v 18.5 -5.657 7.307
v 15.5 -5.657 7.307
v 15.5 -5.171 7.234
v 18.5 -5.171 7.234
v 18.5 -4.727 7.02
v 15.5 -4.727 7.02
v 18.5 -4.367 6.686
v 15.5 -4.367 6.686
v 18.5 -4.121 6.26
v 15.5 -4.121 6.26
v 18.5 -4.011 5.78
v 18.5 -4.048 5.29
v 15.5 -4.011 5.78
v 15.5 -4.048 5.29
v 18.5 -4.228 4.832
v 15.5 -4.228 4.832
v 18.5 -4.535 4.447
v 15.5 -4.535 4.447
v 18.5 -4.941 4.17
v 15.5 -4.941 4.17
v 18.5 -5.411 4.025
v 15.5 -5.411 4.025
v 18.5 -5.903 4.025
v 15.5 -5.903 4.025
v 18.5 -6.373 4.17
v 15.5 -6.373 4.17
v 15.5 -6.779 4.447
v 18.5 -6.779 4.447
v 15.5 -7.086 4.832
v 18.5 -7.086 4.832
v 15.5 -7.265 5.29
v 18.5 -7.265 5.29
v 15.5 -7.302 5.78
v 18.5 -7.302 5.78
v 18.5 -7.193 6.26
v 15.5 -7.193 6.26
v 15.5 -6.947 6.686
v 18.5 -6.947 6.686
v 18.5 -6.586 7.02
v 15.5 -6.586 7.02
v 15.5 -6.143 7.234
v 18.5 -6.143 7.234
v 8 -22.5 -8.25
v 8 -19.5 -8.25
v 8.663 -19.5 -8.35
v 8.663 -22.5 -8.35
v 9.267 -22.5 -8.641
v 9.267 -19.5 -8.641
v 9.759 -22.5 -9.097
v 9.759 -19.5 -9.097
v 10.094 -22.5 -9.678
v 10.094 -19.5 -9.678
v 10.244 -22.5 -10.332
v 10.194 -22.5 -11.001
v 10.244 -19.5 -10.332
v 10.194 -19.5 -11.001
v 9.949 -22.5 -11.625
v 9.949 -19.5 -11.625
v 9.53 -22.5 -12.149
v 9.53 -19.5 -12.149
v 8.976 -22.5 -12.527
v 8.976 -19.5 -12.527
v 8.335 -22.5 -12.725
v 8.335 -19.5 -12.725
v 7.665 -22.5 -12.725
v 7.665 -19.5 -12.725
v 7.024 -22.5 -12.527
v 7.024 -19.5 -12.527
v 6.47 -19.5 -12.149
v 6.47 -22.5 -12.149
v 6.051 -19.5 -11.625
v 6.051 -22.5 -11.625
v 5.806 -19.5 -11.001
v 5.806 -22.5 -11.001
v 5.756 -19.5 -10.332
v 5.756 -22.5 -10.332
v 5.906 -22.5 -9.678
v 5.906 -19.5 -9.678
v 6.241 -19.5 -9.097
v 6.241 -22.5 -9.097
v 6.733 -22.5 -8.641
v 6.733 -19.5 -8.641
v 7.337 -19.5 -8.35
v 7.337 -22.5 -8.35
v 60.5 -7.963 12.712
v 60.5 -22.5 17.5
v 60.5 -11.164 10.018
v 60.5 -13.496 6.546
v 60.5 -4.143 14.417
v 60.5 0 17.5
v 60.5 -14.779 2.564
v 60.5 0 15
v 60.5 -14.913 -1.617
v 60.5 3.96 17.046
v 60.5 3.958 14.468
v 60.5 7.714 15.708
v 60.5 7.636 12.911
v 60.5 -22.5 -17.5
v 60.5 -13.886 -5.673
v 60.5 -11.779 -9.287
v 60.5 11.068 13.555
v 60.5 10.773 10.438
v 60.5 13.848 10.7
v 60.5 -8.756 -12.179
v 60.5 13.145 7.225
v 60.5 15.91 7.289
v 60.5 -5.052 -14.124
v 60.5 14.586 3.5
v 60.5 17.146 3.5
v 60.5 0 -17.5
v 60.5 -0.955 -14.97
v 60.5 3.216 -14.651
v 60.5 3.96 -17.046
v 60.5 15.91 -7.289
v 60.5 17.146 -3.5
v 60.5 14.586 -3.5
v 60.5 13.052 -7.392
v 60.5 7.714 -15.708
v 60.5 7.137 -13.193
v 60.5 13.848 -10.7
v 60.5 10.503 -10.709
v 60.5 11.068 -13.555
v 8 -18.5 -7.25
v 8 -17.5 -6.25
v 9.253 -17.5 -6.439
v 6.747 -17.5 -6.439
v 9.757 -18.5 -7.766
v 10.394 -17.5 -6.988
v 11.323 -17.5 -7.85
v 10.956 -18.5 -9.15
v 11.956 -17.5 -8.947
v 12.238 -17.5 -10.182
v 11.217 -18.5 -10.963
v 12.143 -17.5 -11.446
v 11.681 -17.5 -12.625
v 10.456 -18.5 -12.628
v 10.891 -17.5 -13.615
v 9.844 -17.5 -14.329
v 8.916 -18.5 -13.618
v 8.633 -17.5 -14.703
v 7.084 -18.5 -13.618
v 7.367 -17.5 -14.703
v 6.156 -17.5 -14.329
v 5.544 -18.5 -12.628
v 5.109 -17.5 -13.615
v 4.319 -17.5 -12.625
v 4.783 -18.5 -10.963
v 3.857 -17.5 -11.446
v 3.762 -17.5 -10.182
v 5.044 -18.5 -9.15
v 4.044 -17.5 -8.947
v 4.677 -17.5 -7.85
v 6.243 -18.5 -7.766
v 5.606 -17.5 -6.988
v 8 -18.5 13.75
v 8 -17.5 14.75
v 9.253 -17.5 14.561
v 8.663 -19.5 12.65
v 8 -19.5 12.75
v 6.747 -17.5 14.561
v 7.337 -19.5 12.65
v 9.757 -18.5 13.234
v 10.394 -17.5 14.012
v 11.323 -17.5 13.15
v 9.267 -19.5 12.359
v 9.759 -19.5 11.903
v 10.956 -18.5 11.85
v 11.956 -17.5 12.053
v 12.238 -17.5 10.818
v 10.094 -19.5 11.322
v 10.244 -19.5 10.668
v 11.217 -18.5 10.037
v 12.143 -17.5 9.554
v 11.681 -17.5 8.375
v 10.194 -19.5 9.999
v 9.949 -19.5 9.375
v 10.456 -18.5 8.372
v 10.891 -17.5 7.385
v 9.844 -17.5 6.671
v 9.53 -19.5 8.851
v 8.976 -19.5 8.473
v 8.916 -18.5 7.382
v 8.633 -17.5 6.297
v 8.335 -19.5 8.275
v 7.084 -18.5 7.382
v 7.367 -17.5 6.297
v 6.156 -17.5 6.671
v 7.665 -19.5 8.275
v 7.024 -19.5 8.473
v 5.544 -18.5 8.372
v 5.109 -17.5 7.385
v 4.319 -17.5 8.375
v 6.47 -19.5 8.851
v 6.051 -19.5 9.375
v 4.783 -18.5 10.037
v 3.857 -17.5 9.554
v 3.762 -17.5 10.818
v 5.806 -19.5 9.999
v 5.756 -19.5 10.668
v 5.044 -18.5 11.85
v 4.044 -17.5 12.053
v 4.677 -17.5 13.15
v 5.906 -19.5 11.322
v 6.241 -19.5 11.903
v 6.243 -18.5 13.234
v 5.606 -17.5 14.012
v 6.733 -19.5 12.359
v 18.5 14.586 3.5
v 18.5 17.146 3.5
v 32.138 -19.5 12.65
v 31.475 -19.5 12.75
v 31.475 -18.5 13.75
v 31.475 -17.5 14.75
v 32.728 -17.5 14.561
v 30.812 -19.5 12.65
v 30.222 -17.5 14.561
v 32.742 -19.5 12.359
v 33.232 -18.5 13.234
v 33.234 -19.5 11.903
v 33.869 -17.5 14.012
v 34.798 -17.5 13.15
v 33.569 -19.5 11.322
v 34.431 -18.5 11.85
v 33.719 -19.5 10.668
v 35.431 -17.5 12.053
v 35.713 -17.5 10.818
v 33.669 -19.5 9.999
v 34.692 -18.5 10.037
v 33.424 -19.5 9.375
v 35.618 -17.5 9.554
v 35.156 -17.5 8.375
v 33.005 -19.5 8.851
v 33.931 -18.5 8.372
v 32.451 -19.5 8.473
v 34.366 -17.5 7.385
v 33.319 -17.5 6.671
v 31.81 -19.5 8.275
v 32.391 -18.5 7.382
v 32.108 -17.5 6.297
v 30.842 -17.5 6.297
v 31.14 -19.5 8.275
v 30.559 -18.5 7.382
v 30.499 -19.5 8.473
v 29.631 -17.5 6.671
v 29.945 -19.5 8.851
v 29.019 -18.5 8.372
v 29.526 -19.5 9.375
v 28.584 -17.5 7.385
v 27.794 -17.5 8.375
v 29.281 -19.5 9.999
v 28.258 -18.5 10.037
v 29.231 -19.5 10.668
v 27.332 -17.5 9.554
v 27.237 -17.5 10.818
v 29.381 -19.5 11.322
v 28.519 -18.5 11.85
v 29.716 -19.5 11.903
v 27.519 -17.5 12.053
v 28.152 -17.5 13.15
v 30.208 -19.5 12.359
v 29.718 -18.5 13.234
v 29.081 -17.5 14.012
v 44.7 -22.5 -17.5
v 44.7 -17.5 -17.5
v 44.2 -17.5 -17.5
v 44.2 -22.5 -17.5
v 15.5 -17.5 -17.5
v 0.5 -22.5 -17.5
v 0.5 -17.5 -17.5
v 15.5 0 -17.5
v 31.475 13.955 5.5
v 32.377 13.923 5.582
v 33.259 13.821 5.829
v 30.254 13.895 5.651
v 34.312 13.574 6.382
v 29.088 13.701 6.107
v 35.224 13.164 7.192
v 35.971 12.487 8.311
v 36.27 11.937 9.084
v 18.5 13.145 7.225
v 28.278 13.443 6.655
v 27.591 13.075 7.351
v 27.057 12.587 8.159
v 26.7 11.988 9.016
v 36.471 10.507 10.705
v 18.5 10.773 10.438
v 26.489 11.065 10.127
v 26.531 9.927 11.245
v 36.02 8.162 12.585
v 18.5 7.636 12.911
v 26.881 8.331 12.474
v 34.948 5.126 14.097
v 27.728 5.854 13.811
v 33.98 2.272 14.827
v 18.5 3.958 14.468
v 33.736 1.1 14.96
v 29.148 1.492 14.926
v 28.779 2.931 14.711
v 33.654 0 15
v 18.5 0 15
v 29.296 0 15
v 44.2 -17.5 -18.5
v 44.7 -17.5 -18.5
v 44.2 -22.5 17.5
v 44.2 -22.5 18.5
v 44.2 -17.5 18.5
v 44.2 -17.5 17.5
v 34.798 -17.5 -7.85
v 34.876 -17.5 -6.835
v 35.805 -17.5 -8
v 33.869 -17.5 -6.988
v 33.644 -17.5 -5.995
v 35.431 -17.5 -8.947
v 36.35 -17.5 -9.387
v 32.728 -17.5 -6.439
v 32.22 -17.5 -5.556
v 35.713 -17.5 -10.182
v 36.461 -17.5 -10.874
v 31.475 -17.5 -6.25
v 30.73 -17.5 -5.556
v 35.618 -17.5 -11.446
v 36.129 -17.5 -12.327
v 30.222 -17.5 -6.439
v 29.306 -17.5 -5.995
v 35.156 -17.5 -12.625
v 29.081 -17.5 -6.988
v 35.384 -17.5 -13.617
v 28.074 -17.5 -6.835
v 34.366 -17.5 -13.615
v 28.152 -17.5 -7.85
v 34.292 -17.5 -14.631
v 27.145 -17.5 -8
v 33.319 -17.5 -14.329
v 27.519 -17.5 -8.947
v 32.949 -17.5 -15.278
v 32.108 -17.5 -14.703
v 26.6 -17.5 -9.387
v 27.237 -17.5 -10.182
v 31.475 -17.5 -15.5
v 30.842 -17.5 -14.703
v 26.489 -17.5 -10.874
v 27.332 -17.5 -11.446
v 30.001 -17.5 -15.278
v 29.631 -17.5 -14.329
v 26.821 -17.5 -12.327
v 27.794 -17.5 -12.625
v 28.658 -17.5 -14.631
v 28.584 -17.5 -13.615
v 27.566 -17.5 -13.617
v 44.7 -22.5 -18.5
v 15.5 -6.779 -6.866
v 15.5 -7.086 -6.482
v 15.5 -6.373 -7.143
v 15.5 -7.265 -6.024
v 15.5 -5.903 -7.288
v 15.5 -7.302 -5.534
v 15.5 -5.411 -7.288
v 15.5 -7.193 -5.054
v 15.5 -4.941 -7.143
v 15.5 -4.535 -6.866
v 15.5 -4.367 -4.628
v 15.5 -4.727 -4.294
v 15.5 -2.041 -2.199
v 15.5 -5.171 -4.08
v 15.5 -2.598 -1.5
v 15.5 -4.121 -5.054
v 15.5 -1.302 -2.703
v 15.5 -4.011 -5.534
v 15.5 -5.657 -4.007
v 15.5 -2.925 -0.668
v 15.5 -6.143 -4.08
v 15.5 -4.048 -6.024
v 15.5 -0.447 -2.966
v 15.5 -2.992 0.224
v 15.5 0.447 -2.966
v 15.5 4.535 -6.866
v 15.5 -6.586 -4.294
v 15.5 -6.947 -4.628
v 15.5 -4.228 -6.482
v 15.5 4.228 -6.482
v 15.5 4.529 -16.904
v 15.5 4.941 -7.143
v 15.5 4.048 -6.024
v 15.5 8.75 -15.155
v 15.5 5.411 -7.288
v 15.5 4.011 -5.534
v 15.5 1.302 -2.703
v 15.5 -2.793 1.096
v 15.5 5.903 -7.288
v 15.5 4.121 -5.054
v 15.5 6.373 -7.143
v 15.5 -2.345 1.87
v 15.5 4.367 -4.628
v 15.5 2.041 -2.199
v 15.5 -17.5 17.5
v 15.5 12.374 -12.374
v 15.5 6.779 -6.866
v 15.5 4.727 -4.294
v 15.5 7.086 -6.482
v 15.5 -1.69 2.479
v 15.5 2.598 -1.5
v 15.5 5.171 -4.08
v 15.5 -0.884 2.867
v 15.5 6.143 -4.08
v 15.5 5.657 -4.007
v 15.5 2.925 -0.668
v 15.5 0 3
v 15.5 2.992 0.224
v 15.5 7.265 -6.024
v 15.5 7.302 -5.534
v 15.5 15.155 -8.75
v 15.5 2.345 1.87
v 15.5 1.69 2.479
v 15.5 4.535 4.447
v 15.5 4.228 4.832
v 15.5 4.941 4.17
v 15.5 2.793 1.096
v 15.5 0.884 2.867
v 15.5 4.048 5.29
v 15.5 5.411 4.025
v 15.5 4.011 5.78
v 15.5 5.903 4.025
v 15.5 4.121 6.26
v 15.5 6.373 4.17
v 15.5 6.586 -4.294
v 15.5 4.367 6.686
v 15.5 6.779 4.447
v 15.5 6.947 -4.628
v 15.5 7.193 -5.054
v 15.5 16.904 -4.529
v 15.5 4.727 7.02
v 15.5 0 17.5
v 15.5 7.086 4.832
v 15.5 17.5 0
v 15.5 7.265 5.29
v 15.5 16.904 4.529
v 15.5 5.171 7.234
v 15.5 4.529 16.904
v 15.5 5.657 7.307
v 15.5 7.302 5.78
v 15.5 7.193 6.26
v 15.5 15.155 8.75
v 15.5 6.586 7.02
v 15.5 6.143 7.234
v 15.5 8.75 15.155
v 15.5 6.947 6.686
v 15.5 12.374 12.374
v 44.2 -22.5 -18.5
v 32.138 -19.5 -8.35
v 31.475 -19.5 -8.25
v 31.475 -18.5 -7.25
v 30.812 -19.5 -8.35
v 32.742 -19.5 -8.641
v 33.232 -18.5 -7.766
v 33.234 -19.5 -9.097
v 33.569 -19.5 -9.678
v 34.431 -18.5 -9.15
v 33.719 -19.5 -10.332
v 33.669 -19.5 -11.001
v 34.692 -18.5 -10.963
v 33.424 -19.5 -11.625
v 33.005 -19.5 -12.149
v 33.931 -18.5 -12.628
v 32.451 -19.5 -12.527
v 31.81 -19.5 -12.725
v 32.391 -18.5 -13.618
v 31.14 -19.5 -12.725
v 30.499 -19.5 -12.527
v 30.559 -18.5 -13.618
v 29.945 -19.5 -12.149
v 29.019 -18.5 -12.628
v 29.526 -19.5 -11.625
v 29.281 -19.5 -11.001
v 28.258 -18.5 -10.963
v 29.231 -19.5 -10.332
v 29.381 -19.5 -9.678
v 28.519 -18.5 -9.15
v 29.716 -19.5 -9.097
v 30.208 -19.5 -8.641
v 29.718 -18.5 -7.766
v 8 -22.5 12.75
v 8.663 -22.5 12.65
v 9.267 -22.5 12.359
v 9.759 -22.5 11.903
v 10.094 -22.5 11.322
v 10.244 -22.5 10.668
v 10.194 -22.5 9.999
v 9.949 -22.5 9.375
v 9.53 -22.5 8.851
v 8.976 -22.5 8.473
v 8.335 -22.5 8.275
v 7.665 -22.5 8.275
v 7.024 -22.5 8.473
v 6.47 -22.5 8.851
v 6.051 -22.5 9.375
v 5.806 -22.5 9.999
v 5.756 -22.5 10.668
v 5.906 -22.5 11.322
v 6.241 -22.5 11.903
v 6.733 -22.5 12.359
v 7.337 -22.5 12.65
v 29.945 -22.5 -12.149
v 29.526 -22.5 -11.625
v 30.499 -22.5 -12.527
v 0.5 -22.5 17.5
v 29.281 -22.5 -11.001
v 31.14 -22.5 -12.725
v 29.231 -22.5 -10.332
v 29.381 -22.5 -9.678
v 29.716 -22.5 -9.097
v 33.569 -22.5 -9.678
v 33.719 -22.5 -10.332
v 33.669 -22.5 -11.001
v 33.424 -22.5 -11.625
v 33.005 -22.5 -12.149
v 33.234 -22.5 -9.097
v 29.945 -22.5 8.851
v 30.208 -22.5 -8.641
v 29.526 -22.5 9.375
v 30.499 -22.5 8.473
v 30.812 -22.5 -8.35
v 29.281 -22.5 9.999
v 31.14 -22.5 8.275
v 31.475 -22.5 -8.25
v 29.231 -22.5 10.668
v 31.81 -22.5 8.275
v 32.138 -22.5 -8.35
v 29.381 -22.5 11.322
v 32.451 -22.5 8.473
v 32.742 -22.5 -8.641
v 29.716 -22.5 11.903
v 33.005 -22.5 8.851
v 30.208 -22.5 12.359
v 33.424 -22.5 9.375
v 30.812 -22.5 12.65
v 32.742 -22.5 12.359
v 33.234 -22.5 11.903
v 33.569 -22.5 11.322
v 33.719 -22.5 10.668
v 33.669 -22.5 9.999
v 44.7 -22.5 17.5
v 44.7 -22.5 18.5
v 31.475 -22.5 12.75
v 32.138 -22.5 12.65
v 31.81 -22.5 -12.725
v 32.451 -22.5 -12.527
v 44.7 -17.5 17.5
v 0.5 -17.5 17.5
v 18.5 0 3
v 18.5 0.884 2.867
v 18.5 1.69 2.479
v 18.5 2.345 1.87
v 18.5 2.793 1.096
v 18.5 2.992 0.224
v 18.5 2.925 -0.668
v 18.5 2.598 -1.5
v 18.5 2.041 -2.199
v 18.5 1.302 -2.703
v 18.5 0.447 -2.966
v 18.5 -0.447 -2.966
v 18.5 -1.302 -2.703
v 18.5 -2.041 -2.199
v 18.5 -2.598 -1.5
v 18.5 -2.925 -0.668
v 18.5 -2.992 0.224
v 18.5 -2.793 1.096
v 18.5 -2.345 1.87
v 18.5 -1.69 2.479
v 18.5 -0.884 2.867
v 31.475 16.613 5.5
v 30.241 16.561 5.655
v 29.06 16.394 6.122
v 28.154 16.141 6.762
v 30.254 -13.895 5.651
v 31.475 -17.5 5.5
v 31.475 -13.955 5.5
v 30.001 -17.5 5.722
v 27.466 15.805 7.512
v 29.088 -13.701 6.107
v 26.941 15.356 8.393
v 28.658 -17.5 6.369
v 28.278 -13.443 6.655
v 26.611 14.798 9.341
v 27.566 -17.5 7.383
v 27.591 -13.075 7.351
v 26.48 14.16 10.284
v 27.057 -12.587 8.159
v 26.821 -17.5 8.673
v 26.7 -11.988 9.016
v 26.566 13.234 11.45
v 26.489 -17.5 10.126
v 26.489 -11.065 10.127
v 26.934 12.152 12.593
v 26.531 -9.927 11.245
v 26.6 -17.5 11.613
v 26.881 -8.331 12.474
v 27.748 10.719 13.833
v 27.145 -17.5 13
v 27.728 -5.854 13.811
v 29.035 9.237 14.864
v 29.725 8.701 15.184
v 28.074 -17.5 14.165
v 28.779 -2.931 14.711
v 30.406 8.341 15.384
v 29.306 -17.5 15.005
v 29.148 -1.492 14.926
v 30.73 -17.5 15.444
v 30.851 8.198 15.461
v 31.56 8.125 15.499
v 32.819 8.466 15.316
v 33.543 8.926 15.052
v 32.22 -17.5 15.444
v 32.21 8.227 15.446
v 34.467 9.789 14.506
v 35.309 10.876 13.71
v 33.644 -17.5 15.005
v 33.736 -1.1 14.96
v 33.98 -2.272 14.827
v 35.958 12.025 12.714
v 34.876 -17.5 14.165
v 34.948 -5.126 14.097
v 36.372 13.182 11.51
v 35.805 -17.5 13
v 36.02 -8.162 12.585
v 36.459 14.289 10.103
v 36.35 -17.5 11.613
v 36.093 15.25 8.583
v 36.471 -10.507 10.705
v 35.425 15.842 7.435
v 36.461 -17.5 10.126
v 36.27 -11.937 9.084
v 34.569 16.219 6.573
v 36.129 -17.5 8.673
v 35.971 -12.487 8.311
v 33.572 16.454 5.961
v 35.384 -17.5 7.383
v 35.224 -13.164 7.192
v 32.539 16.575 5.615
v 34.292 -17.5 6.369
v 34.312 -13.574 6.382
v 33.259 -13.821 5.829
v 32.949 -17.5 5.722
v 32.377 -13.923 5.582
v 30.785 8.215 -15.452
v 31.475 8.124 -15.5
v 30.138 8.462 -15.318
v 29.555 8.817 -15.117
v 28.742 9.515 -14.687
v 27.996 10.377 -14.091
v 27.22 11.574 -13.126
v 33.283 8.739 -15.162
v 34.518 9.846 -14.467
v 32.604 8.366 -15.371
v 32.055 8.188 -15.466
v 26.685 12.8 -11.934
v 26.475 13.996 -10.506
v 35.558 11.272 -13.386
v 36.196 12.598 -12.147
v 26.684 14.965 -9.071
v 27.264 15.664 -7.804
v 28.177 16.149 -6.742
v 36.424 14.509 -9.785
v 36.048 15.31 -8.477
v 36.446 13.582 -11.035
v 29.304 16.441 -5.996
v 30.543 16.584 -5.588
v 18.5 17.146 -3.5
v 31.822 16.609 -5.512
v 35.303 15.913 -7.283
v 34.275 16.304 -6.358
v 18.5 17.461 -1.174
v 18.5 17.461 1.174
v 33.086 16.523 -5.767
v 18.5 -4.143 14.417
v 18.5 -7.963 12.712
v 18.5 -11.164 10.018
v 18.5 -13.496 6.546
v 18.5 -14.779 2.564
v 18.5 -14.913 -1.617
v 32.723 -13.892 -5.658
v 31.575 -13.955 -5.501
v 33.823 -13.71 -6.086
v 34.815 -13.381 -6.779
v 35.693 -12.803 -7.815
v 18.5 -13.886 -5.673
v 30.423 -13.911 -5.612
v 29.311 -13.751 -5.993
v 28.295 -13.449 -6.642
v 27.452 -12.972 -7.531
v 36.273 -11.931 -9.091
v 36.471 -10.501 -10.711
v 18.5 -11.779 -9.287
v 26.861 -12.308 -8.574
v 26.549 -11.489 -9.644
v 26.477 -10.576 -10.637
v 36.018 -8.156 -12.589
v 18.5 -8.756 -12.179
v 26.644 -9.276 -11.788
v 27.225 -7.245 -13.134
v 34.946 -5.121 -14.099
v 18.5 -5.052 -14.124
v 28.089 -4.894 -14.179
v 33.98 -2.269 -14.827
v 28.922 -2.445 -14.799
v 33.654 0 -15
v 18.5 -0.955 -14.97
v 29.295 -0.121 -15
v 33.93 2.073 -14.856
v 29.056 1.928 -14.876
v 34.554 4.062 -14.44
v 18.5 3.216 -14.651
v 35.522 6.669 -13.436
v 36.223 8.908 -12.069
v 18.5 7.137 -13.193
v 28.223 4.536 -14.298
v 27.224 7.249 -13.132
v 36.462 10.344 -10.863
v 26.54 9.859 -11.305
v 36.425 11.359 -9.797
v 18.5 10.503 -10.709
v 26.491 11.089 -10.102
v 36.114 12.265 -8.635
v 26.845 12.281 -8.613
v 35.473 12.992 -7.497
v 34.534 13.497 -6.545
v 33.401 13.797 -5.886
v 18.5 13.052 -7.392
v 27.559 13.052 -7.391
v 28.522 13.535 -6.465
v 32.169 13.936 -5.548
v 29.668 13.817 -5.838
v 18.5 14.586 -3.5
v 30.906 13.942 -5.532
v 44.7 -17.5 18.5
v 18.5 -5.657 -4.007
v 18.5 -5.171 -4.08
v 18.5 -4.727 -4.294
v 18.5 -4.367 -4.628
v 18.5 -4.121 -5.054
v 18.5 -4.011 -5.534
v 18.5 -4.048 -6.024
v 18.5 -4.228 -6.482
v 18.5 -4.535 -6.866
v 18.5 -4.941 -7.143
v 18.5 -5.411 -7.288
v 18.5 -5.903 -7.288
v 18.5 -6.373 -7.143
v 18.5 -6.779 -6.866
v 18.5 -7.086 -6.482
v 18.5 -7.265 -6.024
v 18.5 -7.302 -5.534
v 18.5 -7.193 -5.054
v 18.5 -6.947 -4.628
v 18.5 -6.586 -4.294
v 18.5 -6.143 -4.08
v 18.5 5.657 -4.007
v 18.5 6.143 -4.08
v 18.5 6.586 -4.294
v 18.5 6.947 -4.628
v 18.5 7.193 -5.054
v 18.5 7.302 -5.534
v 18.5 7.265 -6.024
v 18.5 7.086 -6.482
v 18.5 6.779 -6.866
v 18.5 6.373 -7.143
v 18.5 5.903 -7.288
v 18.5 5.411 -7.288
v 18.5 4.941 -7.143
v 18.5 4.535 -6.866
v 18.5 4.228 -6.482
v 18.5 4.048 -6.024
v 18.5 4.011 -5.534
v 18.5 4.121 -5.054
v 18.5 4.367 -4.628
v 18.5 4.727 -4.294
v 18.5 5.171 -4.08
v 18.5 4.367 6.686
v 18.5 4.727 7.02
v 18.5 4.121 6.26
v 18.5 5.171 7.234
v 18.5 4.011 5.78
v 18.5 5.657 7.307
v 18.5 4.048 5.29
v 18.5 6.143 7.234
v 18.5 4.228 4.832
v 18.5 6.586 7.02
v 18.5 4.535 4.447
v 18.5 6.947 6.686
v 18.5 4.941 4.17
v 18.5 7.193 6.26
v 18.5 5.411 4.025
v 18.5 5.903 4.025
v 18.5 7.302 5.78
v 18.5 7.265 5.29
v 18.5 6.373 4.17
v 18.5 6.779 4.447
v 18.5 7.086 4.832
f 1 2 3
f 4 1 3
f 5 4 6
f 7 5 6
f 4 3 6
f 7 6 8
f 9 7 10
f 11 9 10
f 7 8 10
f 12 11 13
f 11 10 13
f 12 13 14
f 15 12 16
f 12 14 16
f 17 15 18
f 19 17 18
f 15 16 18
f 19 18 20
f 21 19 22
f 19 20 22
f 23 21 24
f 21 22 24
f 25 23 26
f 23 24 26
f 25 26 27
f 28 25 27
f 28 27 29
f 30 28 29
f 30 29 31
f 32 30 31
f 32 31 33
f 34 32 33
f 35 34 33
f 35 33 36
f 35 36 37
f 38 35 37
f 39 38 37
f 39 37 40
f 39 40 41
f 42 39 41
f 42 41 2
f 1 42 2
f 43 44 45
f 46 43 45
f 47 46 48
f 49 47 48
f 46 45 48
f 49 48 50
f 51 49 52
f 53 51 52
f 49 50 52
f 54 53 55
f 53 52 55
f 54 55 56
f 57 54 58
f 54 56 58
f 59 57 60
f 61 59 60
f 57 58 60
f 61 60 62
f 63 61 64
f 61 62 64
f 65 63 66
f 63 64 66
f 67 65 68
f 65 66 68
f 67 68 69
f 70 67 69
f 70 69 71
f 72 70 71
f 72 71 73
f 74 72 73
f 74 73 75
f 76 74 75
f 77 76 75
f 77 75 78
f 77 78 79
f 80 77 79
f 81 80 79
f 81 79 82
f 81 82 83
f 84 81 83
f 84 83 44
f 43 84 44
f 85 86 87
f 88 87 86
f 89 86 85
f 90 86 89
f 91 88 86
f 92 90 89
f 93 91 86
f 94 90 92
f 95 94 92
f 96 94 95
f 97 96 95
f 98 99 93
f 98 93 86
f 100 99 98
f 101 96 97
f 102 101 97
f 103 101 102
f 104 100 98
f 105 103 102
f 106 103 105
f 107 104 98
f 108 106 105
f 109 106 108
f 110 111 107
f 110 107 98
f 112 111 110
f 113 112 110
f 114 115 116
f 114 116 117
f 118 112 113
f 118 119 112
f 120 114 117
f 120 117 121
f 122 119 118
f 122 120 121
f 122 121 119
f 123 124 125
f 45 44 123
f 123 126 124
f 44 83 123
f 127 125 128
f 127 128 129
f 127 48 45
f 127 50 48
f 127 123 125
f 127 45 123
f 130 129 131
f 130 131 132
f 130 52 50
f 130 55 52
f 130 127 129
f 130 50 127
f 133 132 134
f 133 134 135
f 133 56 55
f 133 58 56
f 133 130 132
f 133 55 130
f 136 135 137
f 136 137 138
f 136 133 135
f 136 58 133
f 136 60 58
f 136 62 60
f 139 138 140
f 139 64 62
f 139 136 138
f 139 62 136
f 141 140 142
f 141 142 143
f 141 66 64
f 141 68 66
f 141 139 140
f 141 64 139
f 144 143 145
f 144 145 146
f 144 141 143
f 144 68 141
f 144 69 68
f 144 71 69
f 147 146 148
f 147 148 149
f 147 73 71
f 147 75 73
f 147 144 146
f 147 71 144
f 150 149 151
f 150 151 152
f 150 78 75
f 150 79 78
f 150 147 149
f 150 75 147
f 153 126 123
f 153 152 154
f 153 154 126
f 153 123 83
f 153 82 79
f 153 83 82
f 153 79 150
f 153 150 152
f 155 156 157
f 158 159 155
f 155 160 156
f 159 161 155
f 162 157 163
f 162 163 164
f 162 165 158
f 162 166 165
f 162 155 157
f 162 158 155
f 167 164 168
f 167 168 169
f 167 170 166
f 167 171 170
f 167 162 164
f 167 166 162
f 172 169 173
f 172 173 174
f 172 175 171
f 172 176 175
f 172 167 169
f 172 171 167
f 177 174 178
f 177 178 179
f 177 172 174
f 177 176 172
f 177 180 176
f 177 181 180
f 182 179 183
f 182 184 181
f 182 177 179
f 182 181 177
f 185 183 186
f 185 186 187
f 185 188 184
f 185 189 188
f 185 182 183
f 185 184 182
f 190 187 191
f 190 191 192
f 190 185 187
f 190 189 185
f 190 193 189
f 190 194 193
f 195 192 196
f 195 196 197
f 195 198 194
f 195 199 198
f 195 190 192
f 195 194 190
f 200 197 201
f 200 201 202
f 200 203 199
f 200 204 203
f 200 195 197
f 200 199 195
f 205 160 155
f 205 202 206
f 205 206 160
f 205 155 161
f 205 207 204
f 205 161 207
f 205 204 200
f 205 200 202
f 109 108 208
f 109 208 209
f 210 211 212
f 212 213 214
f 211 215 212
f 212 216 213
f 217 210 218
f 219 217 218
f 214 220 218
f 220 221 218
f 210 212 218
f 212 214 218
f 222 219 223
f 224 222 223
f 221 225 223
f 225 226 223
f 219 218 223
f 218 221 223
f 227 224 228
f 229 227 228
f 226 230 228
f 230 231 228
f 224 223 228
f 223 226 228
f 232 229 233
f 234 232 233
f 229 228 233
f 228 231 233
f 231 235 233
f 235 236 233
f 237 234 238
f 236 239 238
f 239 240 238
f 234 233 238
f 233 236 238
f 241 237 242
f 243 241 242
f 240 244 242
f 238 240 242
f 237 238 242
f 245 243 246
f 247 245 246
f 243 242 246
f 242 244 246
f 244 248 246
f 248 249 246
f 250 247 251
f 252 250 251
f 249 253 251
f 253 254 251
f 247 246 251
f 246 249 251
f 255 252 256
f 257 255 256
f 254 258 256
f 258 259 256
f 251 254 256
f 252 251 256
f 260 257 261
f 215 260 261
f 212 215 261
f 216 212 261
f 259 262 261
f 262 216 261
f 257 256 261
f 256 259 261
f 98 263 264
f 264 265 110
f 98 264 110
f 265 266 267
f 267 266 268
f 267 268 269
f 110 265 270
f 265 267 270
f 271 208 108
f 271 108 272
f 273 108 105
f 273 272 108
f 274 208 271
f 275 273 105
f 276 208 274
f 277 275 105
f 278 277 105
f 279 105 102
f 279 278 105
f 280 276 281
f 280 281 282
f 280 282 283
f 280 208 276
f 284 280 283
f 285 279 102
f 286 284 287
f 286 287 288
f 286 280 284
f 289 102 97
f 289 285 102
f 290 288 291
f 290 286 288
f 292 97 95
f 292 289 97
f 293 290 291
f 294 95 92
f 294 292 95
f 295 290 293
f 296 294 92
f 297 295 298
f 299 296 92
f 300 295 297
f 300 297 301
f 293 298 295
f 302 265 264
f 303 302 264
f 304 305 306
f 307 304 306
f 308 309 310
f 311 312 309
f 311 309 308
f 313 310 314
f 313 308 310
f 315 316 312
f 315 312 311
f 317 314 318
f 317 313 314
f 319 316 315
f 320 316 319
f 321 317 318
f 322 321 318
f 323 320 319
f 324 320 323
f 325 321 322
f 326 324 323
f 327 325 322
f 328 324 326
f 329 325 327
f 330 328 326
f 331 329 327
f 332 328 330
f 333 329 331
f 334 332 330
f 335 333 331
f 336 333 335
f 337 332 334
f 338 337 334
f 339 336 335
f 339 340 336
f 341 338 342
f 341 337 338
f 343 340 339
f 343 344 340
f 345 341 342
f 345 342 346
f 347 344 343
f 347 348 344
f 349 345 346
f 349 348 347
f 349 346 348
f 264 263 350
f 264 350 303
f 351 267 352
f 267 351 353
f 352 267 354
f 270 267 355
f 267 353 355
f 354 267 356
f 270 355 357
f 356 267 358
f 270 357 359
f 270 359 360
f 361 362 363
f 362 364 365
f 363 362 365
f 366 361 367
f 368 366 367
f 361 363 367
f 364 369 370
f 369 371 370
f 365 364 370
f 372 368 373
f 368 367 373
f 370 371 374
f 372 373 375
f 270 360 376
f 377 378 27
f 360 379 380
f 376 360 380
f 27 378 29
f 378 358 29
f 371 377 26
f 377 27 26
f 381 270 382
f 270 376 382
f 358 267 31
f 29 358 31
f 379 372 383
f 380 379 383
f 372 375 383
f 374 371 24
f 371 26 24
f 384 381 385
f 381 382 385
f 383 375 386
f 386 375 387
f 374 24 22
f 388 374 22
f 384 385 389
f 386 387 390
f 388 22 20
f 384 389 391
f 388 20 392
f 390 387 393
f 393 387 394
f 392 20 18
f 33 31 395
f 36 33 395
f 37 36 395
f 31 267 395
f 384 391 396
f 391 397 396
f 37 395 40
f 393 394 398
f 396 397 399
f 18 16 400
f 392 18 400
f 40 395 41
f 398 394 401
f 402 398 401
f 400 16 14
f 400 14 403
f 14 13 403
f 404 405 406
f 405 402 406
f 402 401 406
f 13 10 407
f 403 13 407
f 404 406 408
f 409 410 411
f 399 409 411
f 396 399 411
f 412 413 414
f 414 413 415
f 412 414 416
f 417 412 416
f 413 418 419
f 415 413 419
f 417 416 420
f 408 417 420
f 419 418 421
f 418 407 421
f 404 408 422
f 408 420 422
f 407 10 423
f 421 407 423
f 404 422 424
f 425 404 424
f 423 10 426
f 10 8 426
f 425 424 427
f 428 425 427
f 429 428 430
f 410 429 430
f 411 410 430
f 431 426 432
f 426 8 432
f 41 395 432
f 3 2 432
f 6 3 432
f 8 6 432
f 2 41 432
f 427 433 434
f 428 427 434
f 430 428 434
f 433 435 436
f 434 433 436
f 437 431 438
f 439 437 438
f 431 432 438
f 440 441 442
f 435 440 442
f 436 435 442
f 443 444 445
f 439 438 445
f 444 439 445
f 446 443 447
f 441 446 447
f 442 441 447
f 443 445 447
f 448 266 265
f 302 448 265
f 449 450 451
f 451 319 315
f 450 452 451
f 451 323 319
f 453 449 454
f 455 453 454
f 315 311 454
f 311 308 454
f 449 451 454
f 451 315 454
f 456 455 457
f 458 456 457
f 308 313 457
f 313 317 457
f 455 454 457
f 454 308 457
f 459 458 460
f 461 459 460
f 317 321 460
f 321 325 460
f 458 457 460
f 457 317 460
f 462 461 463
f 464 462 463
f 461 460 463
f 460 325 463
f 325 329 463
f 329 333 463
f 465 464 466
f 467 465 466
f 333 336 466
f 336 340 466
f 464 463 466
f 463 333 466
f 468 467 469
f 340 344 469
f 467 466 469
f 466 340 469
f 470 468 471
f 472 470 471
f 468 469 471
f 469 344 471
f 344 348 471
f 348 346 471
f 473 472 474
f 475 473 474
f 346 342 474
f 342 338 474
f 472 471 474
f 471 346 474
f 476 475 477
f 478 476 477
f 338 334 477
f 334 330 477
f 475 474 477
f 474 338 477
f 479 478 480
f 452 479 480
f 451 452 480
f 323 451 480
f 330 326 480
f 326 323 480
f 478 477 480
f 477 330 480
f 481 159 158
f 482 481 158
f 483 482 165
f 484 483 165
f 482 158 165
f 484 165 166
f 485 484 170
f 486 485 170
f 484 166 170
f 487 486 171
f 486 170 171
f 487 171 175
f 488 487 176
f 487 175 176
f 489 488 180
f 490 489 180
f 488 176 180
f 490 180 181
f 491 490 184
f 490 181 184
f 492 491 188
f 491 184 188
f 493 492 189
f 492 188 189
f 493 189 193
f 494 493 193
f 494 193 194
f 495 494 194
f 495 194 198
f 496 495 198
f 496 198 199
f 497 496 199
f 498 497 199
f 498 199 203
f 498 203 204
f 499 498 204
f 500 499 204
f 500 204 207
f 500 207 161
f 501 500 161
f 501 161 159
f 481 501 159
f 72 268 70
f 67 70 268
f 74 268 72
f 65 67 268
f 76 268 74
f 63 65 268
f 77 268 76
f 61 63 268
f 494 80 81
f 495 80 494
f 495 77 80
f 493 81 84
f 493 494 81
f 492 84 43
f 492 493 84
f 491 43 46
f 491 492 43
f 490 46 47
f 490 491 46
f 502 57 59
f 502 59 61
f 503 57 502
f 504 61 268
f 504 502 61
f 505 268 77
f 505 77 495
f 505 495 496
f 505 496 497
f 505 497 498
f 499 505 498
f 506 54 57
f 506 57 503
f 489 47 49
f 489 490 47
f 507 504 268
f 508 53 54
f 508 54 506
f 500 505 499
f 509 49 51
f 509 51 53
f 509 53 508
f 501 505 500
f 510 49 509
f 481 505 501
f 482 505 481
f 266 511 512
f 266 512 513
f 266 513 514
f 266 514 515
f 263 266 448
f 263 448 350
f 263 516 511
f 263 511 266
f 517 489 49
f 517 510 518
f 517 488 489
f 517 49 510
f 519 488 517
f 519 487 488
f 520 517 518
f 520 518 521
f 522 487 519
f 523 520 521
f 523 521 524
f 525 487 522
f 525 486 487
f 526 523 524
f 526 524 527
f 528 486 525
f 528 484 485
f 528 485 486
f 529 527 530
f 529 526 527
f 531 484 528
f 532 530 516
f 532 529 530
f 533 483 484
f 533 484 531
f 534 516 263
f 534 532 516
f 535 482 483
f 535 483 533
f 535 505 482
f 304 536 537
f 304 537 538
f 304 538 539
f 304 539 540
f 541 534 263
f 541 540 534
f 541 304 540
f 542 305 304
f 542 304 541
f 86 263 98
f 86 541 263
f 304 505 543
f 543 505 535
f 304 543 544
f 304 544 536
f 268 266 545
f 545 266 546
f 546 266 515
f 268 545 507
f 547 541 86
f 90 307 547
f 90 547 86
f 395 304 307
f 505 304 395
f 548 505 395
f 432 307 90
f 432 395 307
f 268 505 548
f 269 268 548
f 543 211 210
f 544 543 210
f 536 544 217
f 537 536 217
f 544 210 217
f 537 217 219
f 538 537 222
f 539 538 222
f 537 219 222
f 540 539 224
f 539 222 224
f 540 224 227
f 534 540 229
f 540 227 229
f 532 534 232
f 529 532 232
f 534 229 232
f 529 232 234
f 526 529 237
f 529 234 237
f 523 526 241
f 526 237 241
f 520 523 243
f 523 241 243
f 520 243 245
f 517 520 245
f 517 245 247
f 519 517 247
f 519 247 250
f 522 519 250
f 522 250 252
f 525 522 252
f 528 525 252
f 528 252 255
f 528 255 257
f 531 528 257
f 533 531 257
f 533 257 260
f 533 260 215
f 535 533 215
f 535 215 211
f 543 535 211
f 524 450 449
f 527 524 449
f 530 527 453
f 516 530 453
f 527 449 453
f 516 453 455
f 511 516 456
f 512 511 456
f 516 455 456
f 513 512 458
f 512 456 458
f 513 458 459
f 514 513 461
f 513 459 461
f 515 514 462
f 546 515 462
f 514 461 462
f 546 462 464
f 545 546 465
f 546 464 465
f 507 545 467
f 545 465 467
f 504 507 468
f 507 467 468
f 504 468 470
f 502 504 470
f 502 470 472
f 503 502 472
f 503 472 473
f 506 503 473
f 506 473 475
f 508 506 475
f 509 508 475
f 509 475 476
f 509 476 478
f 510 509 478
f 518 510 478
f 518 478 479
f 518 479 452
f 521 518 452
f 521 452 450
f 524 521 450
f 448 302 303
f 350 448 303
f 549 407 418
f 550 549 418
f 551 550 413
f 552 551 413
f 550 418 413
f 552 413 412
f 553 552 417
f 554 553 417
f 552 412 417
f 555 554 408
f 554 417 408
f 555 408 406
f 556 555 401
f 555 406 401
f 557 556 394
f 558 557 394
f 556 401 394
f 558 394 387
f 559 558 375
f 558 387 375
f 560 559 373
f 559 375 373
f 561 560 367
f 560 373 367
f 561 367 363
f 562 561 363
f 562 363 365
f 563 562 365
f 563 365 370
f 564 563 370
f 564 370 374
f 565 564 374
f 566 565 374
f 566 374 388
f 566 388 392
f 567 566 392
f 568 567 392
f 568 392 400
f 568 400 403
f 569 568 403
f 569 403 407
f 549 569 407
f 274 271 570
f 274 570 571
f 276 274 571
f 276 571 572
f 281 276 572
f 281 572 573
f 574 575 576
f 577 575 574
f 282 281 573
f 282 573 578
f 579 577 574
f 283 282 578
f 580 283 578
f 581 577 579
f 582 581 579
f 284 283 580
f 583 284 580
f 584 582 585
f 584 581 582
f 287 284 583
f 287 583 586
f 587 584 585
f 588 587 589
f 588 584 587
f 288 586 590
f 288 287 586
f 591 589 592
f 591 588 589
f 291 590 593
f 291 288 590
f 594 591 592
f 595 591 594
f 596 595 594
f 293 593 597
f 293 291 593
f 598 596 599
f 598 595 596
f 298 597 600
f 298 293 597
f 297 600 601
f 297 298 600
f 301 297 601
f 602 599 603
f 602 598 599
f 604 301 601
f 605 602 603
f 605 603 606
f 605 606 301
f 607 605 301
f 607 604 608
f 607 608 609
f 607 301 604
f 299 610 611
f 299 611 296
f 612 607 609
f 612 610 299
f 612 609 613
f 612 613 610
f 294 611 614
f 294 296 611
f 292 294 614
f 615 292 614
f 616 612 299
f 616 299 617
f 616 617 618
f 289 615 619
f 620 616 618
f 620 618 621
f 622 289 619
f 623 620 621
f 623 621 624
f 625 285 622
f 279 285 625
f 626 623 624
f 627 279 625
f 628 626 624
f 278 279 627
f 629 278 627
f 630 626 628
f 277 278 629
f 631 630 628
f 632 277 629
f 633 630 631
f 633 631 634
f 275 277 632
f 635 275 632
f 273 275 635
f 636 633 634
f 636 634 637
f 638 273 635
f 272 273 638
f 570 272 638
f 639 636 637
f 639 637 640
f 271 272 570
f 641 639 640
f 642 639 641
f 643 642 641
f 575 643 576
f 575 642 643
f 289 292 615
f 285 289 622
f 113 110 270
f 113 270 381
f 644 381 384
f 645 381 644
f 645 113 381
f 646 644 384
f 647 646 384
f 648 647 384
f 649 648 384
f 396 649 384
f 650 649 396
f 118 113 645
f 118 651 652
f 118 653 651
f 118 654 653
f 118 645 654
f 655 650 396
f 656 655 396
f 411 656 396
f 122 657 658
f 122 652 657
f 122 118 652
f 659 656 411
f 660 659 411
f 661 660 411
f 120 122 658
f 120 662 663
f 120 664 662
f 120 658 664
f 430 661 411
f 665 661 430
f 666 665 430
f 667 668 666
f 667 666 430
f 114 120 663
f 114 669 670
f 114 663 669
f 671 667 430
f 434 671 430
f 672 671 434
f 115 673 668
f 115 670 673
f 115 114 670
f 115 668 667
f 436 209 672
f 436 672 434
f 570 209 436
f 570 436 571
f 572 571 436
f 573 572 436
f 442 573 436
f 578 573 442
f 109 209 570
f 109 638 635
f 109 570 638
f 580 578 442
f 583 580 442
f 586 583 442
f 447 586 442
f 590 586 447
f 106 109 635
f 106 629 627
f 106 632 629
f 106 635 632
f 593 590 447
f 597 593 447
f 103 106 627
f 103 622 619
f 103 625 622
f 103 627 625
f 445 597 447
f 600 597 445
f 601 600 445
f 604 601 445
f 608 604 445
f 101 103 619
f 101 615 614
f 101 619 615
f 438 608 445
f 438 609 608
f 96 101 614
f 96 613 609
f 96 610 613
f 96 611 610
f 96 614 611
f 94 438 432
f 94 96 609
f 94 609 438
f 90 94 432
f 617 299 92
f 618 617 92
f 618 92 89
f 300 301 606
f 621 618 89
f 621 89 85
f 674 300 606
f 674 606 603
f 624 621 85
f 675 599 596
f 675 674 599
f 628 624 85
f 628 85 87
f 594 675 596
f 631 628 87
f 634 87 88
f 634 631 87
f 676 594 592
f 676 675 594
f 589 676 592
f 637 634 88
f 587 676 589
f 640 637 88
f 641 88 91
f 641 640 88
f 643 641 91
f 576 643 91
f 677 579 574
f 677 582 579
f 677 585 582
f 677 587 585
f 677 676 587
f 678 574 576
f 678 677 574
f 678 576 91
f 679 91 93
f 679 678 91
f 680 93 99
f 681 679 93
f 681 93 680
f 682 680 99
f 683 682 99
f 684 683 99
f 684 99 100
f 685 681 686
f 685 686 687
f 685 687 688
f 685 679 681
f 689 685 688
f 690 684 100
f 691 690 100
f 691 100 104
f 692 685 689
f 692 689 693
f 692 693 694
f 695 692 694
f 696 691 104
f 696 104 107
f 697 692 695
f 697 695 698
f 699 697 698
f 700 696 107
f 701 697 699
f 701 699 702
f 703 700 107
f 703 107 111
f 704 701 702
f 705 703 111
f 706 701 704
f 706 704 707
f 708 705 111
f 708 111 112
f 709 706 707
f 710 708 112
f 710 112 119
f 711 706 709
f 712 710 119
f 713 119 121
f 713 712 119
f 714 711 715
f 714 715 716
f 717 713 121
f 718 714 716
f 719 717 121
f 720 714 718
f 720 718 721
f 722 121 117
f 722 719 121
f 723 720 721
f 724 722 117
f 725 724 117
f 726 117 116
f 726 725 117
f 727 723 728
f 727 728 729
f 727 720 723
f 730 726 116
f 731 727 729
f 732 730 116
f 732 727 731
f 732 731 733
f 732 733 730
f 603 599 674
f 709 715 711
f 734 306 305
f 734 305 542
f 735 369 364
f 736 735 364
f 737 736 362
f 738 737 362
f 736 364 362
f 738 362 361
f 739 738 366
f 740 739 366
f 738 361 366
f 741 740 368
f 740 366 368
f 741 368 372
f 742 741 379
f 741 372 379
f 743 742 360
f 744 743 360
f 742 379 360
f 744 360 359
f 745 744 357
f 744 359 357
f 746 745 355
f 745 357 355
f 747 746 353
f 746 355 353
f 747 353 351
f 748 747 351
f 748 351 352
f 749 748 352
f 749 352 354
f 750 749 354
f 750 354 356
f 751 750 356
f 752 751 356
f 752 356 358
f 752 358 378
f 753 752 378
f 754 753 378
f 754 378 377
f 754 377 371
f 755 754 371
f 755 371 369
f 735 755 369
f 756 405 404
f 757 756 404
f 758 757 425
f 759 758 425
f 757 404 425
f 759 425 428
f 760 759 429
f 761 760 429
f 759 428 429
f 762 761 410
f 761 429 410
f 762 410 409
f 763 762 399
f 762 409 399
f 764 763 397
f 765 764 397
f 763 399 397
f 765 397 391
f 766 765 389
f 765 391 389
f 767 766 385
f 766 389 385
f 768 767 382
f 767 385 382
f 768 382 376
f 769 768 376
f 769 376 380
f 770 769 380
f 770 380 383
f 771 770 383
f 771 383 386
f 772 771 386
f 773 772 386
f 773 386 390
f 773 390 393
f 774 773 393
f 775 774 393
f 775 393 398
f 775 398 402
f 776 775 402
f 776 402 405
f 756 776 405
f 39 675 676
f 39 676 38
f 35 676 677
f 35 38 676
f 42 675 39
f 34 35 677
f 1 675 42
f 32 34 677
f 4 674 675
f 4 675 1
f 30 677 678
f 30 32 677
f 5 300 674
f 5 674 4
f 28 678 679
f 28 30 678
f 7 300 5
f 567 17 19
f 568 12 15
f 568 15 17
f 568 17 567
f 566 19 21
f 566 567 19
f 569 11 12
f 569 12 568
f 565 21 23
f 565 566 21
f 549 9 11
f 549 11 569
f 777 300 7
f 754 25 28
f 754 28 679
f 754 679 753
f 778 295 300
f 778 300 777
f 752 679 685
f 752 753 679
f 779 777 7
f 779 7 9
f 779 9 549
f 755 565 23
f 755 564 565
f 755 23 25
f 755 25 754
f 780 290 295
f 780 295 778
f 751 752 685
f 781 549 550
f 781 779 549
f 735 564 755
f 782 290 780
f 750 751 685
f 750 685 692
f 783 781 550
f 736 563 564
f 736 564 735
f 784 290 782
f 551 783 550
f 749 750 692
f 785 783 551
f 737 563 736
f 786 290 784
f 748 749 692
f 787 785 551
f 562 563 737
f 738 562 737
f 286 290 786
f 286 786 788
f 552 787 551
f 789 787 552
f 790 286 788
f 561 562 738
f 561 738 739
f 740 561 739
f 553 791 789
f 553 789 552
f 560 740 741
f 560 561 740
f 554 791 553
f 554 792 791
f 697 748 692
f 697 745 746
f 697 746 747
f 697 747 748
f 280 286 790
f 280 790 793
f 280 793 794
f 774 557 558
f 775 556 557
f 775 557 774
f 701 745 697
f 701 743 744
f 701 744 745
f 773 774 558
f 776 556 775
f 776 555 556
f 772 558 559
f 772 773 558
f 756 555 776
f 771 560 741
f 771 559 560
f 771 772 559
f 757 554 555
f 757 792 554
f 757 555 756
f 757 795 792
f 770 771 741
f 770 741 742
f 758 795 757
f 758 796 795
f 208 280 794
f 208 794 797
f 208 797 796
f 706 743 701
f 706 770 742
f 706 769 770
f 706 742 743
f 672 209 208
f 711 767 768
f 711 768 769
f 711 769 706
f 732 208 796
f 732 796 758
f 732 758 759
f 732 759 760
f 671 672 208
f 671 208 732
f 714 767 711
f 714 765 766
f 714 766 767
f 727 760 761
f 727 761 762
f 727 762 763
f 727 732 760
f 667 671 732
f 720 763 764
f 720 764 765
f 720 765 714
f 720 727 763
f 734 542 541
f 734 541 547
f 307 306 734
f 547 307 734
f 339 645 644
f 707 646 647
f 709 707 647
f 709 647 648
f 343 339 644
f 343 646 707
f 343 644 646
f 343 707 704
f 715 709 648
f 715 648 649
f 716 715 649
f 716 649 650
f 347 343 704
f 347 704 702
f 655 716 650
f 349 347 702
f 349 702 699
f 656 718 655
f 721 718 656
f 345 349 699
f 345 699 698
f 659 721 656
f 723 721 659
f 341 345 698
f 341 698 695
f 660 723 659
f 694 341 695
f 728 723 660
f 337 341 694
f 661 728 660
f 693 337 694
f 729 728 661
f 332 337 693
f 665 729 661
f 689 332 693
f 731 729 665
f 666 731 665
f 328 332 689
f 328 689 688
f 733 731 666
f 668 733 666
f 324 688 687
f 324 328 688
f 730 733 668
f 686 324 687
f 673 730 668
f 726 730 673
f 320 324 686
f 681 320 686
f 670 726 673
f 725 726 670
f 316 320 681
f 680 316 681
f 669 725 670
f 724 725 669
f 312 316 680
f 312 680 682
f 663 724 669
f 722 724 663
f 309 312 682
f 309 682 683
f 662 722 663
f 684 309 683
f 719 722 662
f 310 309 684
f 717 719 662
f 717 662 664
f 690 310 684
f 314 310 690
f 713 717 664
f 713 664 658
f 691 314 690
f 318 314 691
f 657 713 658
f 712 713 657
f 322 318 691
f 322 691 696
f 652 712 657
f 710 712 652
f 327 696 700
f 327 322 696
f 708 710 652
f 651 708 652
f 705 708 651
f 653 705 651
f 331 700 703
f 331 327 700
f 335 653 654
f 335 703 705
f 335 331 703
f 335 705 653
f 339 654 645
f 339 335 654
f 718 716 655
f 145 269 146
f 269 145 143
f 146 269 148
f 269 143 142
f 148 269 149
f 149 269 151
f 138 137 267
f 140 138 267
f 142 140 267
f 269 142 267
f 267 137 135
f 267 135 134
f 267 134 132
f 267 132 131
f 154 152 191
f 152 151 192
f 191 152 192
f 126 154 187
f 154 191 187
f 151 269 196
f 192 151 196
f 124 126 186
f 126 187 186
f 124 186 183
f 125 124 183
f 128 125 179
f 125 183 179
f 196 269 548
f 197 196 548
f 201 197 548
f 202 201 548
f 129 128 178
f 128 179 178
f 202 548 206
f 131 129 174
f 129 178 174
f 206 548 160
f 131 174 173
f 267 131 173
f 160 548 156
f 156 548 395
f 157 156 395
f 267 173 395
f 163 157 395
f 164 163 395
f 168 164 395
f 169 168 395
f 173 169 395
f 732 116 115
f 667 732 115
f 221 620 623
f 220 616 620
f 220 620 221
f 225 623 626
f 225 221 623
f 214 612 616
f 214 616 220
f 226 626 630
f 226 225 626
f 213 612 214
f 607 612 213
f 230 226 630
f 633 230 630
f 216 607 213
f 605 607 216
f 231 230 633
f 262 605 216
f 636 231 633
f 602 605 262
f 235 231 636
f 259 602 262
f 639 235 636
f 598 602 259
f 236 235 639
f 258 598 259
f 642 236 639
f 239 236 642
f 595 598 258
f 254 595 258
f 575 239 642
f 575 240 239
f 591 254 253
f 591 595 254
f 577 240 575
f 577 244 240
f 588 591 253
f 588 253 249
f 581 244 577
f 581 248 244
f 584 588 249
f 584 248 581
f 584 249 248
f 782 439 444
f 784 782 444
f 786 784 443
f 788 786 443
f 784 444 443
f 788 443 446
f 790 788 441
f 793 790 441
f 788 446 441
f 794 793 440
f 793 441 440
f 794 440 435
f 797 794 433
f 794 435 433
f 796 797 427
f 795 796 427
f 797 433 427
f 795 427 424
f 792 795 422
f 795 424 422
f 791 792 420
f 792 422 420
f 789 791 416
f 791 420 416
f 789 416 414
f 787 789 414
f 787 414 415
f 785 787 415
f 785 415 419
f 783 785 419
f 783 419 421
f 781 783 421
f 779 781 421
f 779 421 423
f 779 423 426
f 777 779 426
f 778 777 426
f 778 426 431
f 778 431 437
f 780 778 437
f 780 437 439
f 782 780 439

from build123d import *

# Parameters (mm, degrees)
BOSS_EXTRUDE1_DEPTH = 17.5
BOSS_EXTRUDE2_START = 1
SKETCH2_W           = 0.5
SKETCH2_H           = 5
BOSS_EXTRUDE2_DEPTH = 37
SKETCH3_R           = 3
SKETCH3_R_2         = 1.65
CUT_EXTRUDE1_DEPTH  = 54.605037077
SKETCH4_W           = 35
SKETCH4_H           = 35
SKETCH4_R           = 15
BOSS_EXTRUDE3_DEPTH = 42
CUT_EXTRUDE2_DEPTH  = 67.697076398
SKETCH6_R           = 5
CUT_EXTRUDE3_DEPTH  = 73.301452268
SKETCH7_R           = 2.25
CUT_EXTRUDE4_DEPTH  = 73.3014524
CHAMFER1_SIZE       = 2
SKETCH8_W           = 7
SKETCH8_H           = 2.914047854
CUT_EXTRUDE5_DEPTH  = 42


with BuildPart() as part:
    # Sketch1 → Boss-Extrude1 (new, symmetric)
    with BuildSketch(Plane.XY):
        Polygon((0.5, -17.5), (15.5, -17.5), (15.5, 17.5), (18.5, 17.5), (18.5, -17.5), (60.5, -17.5), (60.5, -22.5), (0.5, -22.5), align=None)
    extrude(amount=BOSS_EXTRUDE1_DEPTH, both=True)

    # Sketch2 → Boss-Extrude2 (add)
    with BuildSketch(Plane.XY.offset(17.5).offset(BOSS_EXTRUDE2_START)):
        with Locations((44.45, -20)):
            Rectangle(SKETCH2_W, SKETCH2_H)
    extrude(amount=-BOSS_EXTRUDE2_DEPTH)

    # Sketch3 → Cut-Extrude1 (cut, through all)
    with BuildSketch(Plane.ZY.offset(-15.5)):
        Circle(SKETCH3_R)
        with Locations((-5.656854249, 5.656854249)):
            Circle(SKETCH3_R_2)
        with Locations((5.656854249, 5.656854249)):
            Circle(SKETCH3_R_2)
        with Locations((5.656854249, -5.656854249)):
            Circle(SKETCH3_R_2)
        with Locations((-5.656854249, -5.656854249)):
            Circle(SKETCH3_R_2)
    extrude(amount=-CUT_EXTRUDE1_DEPTH, mode=Mode.SUBTRACT)

    # Sketch4 → Boss-Extrude3 (add, through all)
    with BuildSketch(Plane(origin=(18.5, 0, 0), x_dir=(0, 0, -1), z_dir=(1, 0, 0))):
        Rectangle(SKETCH4_W, SKETCH4_H)
        with Locations(Location((0, 0, 0), (0, 0, 180))):
            Circle(SKETCH4_R, mode=Mode.SUBTRACT)
    extrude(amount=BOSS_EXTRUDE3_DEPTH)

    # Sketch5 → Cut-Extrude2 (cut, through all)
    with BuildSketch(Plane(origin=(60.5, 0, 0), x_dir=(0, 0, -1), z_dir=(1, 0, 0))):
        with BuildLine():
            Line((-17.5, 0), (-17.5, 18.5))
            Line((-17.5, 18.5), (17.5, 18.5))
            Line((17.5, 18.5), (17.5, 0))
            ThreePointArc((17.5, 0), (0, 17.5), (-17.5, 0))
        make_face()
    extrude(amount=-CUT_EXTRUDE2_DEPTH, mode=Mode.SUBTRACT)

    # Sketch6 → Cut-Extrude3 (cut, through all)
    with BuildSketch(Plane(origin=(0, -17.5, 0), x_dir=(1, 0, 0), z_dir=(0, 1, 0))):
        with Locations(Location((31.475, -10.5, 0), (0, 0, 90))):
            Circle(SKETCH6_R)
        with Locations(Location((31.475, 10.5, 0), (0, 0, 90))):
            Circle(SKETCH6_R)
    extrude(amount=CUT_EXTRUDE3_DEPTH, mode=Mode.SUBTRACT)

    # Sketch7 → Cut-Extrude4 (cut, through all)
    with BuildSketch(Plane(origin=(0, -17.5, 0), x_dir=(1, 0, 0), z_dir=(0, 1, 0))):
        with Locations(Location((8, 10.5, 0), (0, 0, 270))):
            Circle(SKETCH7_R)
        with Locations(Location((8, -10.5, 0), (0, 0, 270))):
            Circle(SKETCH7_R)
        with Locations(Location((31.475, -10.5, 0), (0, 0, 270))):
            Circle(SKETCH7_R)
        with Locations(Location((31.475, 10.5, 0), (0, 0, 270))):
            Circle(SKETCH7_R)
    extrude(amount=-CUT_EXTRUDE4_DEPTH, mode=Mode.SUBTRACT)

    # Chamfer1
    chamfer1_edges = [part.edges().sort_by_distance(p)[0] for p in [
        (31.475, -17.5, 8.25),
        (8, -17.5, -12.75),
        (31.475, -17.5, -12.75),
        (8, -17.5, 8.25),
    ]]
    chamfer(chamfer1_edges, length=CHAMFER1_SIZE)

    # Sketch8 → Cut-Extrude5 (cut)
    with BuildSketch(Plane(origin=(60.5, 0, 0), x_dir=(0, 0, -1), z_dir=(1, 0, 0))):
        with Locations((0, 16.042976073)):
            Rectangle(SKETCH8_W, SKETCH8_H)
    extrude(amount=-CUT_EXTRUDE5_DEPTH, mode=Mode.SUBTRACT)


solid = part.part
